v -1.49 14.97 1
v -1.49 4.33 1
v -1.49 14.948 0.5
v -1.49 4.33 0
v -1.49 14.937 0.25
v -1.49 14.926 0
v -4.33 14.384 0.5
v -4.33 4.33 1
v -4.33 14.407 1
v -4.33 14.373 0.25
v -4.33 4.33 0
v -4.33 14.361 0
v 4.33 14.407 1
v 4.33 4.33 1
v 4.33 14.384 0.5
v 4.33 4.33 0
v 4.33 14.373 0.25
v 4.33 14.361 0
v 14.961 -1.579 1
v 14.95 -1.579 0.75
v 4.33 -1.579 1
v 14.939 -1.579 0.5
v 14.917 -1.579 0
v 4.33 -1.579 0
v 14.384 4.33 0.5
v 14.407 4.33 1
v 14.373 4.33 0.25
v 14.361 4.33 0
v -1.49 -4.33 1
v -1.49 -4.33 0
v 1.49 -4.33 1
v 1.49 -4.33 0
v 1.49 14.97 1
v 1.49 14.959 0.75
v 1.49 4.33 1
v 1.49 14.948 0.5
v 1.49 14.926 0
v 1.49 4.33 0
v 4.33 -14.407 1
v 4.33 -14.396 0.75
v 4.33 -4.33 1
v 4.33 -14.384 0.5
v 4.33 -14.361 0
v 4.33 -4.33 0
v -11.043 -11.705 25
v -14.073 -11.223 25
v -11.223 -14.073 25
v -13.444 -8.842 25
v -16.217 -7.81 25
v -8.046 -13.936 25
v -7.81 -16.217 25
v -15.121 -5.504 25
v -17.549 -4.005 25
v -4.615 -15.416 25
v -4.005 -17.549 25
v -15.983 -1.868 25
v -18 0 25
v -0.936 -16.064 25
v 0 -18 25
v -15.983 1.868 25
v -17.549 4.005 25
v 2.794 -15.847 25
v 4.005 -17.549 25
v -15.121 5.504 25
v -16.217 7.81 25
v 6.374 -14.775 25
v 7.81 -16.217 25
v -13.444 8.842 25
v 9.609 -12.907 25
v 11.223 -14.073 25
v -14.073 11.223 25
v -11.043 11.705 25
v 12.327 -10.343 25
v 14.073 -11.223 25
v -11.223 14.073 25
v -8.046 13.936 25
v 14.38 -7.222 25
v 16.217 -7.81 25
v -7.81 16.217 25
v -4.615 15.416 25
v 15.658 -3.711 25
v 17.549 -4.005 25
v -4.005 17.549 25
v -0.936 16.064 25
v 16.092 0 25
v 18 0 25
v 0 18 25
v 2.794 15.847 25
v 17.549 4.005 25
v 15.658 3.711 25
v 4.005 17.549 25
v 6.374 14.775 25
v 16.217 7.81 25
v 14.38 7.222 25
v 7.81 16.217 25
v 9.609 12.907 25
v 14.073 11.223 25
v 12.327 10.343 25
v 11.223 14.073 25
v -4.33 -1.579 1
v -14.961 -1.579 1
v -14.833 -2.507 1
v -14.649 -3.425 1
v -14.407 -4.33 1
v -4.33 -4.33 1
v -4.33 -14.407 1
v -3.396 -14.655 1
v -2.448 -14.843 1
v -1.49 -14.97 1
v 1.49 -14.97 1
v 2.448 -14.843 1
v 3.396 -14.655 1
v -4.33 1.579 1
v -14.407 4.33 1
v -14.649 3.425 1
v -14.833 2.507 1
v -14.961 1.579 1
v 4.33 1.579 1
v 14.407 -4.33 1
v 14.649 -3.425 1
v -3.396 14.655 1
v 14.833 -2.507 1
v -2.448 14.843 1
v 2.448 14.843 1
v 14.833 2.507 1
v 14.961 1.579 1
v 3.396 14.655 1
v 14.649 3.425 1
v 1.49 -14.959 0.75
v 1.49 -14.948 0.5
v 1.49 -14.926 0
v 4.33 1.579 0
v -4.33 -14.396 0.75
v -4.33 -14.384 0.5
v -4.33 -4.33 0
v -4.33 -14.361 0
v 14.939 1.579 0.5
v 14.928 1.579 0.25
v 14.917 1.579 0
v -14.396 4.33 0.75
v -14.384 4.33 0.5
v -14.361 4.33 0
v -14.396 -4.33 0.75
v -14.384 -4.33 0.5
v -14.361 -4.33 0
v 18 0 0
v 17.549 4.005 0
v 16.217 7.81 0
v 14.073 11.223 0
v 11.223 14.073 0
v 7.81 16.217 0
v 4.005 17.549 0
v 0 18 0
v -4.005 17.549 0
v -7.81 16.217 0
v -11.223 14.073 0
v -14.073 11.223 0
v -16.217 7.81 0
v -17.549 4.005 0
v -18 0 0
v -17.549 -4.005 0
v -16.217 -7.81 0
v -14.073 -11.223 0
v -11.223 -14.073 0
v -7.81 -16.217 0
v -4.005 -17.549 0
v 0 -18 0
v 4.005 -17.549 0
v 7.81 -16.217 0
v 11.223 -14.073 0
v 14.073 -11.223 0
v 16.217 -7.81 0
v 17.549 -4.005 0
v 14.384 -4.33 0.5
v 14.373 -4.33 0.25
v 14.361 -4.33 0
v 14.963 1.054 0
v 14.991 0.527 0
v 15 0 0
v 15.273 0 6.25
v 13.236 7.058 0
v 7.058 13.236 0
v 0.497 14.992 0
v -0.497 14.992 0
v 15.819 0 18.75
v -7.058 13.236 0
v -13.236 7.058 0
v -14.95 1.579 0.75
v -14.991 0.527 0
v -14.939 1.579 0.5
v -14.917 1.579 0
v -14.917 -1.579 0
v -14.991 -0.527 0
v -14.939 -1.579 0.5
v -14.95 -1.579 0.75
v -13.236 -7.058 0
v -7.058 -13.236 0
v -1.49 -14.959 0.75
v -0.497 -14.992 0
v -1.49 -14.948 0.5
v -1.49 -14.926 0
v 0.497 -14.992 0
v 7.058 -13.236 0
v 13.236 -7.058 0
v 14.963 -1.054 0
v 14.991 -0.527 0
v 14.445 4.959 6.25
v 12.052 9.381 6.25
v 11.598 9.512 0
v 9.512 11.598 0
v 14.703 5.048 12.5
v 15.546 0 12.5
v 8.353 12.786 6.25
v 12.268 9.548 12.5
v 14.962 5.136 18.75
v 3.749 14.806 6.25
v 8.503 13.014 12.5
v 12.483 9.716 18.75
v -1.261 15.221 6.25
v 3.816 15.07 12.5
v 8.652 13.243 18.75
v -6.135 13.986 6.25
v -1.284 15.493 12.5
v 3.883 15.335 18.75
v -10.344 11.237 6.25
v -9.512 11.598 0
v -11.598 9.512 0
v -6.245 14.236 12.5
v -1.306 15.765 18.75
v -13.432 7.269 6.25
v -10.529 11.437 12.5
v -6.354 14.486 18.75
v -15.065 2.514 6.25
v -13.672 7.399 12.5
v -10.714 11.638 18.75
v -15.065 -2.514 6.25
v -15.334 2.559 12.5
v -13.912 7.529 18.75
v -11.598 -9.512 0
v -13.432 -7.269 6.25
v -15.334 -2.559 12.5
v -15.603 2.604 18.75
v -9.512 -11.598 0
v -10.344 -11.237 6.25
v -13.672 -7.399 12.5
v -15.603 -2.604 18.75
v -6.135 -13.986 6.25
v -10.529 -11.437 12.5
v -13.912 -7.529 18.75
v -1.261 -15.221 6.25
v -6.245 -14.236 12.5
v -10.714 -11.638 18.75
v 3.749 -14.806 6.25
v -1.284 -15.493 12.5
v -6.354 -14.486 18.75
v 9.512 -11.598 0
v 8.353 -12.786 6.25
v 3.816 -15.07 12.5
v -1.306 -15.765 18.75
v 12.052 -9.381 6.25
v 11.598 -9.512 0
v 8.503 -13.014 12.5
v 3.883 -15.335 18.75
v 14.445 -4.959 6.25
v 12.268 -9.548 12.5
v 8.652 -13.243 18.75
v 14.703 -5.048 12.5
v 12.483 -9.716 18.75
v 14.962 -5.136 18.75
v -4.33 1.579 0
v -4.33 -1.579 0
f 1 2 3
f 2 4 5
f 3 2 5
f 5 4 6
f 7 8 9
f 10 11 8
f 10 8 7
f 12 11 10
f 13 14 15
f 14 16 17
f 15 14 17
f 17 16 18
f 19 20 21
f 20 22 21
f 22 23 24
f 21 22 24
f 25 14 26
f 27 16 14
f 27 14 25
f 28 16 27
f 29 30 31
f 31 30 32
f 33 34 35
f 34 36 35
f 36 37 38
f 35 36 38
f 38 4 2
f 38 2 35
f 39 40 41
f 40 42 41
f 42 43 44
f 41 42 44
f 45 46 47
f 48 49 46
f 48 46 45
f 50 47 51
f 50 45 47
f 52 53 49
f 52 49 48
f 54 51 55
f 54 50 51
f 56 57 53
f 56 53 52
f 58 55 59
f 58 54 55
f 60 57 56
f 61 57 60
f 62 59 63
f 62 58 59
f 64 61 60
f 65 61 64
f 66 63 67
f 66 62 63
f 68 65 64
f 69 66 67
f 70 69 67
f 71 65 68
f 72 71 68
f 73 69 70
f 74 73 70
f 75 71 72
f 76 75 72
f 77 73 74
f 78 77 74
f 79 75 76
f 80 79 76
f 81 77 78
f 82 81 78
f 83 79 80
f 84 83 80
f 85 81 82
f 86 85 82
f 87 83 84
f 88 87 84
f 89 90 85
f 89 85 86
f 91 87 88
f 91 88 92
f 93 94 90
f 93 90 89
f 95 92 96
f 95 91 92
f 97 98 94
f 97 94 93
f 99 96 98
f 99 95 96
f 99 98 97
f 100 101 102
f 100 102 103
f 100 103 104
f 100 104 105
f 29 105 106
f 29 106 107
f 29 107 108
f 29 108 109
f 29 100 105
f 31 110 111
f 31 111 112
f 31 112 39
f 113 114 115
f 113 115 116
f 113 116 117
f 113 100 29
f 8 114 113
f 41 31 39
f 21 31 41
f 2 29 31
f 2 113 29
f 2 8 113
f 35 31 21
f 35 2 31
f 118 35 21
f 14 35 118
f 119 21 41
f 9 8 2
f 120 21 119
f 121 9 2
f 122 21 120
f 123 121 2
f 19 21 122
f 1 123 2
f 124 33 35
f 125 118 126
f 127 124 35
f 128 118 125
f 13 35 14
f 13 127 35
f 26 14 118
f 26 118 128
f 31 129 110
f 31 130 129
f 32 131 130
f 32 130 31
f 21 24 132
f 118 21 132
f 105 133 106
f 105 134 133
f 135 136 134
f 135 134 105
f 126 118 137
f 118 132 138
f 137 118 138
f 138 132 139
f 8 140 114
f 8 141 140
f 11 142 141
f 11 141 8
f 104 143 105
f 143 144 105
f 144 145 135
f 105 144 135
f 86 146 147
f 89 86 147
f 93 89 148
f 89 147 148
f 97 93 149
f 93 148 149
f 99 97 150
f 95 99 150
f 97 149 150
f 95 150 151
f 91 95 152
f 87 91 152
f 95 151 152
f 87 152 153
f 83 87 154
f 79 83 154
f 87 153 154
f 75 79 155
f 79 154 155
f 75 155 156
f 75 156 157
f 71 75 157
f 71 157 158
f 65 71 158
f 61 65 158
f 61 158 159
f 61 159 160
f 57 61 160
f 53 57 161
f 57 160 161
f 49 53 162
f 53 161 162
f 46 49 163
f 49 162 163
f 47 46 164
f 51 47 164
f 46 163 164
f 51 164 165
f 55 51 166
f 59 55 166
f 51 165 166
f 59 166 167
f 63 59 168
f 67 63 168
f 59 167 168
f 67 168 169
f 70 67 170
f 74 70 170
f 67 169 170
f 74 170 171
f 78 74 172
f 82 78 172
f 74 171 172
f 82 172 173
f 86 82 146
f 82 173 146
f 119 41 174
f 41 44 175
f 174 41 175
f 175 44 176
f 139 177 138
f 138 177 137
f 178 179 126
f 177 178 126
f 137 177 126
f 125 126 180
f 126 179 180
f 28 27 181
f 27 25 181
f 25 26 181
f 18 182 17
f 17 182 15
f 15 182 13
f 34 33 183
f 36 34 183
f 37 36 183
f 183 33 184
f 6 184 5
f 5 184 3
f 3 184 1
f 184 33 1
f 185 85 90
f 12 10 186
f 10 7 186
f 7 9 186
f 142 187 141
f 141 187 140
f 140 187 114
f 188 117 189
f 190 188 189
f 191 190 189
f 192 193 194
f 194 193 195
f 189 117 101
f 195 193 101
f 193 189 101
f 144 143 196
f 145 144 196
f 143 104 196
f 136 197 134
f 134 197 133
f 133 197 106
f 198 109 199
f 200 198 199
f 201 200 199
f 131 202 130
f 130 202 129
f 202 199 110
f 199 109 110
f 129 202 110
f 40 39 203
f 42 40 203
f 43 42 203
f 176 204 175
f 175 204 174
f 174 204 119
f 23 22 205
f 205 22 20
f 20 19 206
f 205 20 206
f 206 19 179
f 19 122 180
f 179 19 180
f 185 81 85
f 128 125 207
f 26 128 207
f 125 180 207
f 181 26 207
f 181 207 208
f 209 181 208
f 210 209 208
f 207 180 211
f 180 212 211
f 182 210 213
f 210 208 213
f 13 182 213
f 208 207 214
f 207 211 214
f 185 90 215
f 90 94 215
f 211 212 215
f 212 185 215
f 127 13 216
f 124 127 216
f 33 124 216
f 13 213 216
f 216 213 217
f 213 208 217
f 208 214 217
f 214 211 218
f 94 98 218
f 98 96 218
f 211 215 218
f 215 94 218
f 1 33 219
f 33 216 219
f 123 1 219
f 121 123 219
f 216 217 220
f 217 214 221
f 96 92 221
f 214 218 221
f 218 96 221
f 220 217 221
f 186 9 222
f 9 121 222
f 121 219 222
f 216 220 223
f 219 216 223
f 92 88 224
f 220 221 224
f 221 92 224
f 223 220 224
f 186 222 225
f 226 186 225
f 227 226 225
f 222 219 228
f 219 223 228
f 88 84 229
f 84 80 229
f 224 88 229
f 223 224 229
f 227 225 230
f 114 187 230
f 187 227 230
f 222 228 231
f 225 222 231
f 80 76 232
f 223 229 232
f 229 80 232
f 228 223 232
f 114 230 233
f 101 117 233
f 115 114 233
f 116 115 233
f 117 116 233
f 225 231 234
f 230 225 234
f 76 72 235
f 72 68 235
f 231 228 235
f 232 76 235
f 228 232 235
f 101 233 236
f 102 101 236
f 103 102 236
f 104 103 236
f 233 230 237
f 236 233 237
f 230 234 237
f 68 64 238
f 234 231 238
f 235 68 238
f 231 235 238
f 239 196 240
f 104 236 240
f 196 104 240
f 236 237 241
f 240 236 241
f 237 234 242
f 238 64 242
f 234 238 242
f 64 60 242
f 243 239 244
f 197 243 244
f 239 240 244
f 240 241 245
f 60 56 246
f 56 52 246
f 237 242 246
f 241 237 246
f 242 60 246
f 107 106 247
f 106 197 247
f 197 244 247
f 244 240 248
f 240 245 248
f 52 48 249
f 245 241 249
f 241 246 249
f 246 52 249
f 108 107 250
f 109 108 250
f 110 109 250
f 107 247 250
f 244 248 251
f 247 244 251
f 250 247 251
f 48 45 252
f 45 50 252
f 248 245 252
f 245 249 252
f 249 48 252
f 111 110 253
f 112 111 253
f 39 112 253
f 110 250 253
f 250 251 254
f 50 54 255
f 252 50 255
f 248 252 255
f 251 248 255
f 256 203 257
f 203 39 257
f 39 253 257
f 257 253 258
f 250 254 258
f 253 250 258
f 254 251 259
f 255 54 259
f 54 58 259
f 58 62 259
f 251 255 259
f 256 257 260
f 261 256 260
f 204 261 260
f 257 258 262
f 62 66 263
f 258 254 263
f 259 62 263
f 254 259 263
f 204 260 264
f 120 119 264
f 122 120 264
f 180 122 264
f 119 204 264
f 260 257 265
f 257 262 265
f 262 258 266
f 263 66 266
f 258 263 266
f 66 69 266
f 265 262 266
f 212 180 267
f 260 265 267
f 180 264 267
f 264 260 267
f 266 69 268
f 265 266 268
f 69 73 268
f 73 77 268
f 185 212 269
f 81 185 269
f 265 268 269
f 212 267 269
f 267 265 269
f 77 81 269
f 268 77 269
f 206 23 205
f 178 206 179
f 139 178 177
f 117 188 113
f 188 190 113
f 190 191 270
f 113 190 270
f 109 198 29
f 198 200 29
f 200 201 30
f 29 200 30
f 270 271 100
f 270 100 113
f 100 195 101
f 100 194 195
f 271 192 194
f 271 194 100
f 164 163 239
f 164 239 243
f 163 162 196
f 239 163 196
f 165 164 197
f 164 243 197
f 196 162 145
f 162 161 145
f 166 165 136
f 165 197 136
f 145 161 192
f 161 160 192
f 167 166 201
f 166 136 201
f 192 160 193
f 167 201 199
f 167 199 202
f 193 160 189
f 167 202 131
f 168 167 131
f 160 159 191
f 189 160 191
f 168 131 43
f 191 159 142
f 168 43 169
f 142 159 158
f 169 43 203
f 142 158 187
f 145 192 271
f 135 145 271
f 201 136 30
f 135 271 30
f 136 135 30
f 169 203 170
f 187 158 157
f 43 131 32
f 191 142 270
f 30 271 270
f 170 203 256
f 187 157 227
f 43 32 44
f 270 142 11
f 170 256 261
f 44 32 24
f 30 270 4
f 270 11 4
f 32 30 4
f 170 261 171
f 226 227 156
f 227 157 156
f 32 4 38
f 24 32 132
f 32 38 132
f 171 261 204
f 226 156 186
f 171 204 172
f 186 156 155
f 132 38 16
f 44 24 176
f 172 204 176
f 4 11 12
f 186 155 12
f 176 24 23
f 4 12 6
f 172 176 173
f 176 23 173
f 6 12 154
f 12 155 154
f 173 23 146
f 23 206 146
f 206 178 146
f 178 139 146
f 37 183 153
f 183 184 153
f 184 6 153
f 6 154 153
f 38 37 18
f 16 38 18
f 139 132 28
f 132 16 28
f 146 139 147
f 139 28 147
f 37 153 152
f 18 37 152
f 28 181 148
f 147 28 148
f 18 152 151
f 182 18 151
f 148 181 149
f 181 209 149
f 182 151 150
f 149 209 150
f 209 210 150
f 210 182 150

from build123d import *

# Parameters (mm, degrees)
F0_R     = 18
F0_R_2   = 15
F1_DEPTH = 25
F2_SIZE2 = 1.091514
F2_SIZE  = 24.99999
F3_W     = 11.1970370635
F3_H     = 2.7507020859
F3_W_2   = 2.8398953145
F3_H_2   = 11.1970370635
F3_H_3   = 3.1587614212
F3_W_3   = 2.980374964
F4_DEPTH = 1


# Not quite as in the source:
# - a fillet or chamfer is up to 0.001 mm smaller than in the source, because OpenCascade refuses the exact size


with BuildPart() as f1:
    # F0 (on Top) → F1 (new body)
    with BuildSketch(Plane.XY):
        Circle(F0_R)
        Circle(F0_R_2, mode=Mode.SUBTRACT)
    extrude(amount=F1_DEPTH)

    # F2 (size 25 and 1.0915235727 in the source; OpenCascade refuses exactly that, so slightly less here)
    f2_edges = [f1.edges().sort_by_distance(p)[0] for p in [
        (-15, 0, 25),
    ]]
    f2_side = f1.faces().sort_by_distance((-15, 0, 12.5))[0]
    chamfer(f2_edges, length=F2_SIZE, length2=F2_SIZE2, reference=f2_side)

    # F3 (on Top) → F4 (join)
    with BuildSketch(Plane.XY):
        with Locations((-9.9286013283, 2.9547317536)):
            Rectangle(F3_W, F3_H)
        with Locations((-9.9286013283, -2.9547317536)):
            Rectangle(F3_W, F3_H)
        with Locations((2.9101351392, 9.9286013283)):
            Rectangle(F3_W_2, F3_H_2)
        with Locations((-2.9101351392, 9.9286013283)):
            Rectangle(F3_W_2, F3_H_2)
        with Locations((9.9286013283, 2.9547317536)):
            Rectangle(F3_W, F3_H)
        with Locations((9.9286013283, -2.9547317536)):
            Rectangle(F3_W, F3_H)
        with Locations((2.9101351392, -9.9286013283)):
            Rectangle(F3_W_2, F3_H_2)
        with Locations((-2.9101351392, -9.9286013283)):
            Rectangle(F3_W_2, F3_H_2)
        with Locations((2.9101351392, 2.9547317536)):
            Rectangle(F3_W_2, F3_H)
        with Locations((-2.9101351392, 2.9547317536)):
            Rectangle(F3_W_2, F3_H)
        with Locations((-2.9101351392, 0)):
            Rectangle(F3_W_2, F3_H_3)
        with Locations((-2.9101351392, -2.9547317536)):
            Rectangle(F3_W_2, F3_H)
        with Locations((0, -2.9547317536)):
            Rectangle(F3_W_3, F3_H)
        with Locations((2.9101351392, -2.9547317536)):
            Rectangle(F3_W_2, F3_H)
        with Locations((2.9101351392, 0)):
            Rectangle(F3_W_2, F3_H_3)
        with Locations((0, 2.9547317536)):
            Rectangle(F3_W_3, F3_H)
        Rectangle(F3_W_3, F3_H_3)
    extrude(amount=F4_DEPTH)


solid = f1.part
